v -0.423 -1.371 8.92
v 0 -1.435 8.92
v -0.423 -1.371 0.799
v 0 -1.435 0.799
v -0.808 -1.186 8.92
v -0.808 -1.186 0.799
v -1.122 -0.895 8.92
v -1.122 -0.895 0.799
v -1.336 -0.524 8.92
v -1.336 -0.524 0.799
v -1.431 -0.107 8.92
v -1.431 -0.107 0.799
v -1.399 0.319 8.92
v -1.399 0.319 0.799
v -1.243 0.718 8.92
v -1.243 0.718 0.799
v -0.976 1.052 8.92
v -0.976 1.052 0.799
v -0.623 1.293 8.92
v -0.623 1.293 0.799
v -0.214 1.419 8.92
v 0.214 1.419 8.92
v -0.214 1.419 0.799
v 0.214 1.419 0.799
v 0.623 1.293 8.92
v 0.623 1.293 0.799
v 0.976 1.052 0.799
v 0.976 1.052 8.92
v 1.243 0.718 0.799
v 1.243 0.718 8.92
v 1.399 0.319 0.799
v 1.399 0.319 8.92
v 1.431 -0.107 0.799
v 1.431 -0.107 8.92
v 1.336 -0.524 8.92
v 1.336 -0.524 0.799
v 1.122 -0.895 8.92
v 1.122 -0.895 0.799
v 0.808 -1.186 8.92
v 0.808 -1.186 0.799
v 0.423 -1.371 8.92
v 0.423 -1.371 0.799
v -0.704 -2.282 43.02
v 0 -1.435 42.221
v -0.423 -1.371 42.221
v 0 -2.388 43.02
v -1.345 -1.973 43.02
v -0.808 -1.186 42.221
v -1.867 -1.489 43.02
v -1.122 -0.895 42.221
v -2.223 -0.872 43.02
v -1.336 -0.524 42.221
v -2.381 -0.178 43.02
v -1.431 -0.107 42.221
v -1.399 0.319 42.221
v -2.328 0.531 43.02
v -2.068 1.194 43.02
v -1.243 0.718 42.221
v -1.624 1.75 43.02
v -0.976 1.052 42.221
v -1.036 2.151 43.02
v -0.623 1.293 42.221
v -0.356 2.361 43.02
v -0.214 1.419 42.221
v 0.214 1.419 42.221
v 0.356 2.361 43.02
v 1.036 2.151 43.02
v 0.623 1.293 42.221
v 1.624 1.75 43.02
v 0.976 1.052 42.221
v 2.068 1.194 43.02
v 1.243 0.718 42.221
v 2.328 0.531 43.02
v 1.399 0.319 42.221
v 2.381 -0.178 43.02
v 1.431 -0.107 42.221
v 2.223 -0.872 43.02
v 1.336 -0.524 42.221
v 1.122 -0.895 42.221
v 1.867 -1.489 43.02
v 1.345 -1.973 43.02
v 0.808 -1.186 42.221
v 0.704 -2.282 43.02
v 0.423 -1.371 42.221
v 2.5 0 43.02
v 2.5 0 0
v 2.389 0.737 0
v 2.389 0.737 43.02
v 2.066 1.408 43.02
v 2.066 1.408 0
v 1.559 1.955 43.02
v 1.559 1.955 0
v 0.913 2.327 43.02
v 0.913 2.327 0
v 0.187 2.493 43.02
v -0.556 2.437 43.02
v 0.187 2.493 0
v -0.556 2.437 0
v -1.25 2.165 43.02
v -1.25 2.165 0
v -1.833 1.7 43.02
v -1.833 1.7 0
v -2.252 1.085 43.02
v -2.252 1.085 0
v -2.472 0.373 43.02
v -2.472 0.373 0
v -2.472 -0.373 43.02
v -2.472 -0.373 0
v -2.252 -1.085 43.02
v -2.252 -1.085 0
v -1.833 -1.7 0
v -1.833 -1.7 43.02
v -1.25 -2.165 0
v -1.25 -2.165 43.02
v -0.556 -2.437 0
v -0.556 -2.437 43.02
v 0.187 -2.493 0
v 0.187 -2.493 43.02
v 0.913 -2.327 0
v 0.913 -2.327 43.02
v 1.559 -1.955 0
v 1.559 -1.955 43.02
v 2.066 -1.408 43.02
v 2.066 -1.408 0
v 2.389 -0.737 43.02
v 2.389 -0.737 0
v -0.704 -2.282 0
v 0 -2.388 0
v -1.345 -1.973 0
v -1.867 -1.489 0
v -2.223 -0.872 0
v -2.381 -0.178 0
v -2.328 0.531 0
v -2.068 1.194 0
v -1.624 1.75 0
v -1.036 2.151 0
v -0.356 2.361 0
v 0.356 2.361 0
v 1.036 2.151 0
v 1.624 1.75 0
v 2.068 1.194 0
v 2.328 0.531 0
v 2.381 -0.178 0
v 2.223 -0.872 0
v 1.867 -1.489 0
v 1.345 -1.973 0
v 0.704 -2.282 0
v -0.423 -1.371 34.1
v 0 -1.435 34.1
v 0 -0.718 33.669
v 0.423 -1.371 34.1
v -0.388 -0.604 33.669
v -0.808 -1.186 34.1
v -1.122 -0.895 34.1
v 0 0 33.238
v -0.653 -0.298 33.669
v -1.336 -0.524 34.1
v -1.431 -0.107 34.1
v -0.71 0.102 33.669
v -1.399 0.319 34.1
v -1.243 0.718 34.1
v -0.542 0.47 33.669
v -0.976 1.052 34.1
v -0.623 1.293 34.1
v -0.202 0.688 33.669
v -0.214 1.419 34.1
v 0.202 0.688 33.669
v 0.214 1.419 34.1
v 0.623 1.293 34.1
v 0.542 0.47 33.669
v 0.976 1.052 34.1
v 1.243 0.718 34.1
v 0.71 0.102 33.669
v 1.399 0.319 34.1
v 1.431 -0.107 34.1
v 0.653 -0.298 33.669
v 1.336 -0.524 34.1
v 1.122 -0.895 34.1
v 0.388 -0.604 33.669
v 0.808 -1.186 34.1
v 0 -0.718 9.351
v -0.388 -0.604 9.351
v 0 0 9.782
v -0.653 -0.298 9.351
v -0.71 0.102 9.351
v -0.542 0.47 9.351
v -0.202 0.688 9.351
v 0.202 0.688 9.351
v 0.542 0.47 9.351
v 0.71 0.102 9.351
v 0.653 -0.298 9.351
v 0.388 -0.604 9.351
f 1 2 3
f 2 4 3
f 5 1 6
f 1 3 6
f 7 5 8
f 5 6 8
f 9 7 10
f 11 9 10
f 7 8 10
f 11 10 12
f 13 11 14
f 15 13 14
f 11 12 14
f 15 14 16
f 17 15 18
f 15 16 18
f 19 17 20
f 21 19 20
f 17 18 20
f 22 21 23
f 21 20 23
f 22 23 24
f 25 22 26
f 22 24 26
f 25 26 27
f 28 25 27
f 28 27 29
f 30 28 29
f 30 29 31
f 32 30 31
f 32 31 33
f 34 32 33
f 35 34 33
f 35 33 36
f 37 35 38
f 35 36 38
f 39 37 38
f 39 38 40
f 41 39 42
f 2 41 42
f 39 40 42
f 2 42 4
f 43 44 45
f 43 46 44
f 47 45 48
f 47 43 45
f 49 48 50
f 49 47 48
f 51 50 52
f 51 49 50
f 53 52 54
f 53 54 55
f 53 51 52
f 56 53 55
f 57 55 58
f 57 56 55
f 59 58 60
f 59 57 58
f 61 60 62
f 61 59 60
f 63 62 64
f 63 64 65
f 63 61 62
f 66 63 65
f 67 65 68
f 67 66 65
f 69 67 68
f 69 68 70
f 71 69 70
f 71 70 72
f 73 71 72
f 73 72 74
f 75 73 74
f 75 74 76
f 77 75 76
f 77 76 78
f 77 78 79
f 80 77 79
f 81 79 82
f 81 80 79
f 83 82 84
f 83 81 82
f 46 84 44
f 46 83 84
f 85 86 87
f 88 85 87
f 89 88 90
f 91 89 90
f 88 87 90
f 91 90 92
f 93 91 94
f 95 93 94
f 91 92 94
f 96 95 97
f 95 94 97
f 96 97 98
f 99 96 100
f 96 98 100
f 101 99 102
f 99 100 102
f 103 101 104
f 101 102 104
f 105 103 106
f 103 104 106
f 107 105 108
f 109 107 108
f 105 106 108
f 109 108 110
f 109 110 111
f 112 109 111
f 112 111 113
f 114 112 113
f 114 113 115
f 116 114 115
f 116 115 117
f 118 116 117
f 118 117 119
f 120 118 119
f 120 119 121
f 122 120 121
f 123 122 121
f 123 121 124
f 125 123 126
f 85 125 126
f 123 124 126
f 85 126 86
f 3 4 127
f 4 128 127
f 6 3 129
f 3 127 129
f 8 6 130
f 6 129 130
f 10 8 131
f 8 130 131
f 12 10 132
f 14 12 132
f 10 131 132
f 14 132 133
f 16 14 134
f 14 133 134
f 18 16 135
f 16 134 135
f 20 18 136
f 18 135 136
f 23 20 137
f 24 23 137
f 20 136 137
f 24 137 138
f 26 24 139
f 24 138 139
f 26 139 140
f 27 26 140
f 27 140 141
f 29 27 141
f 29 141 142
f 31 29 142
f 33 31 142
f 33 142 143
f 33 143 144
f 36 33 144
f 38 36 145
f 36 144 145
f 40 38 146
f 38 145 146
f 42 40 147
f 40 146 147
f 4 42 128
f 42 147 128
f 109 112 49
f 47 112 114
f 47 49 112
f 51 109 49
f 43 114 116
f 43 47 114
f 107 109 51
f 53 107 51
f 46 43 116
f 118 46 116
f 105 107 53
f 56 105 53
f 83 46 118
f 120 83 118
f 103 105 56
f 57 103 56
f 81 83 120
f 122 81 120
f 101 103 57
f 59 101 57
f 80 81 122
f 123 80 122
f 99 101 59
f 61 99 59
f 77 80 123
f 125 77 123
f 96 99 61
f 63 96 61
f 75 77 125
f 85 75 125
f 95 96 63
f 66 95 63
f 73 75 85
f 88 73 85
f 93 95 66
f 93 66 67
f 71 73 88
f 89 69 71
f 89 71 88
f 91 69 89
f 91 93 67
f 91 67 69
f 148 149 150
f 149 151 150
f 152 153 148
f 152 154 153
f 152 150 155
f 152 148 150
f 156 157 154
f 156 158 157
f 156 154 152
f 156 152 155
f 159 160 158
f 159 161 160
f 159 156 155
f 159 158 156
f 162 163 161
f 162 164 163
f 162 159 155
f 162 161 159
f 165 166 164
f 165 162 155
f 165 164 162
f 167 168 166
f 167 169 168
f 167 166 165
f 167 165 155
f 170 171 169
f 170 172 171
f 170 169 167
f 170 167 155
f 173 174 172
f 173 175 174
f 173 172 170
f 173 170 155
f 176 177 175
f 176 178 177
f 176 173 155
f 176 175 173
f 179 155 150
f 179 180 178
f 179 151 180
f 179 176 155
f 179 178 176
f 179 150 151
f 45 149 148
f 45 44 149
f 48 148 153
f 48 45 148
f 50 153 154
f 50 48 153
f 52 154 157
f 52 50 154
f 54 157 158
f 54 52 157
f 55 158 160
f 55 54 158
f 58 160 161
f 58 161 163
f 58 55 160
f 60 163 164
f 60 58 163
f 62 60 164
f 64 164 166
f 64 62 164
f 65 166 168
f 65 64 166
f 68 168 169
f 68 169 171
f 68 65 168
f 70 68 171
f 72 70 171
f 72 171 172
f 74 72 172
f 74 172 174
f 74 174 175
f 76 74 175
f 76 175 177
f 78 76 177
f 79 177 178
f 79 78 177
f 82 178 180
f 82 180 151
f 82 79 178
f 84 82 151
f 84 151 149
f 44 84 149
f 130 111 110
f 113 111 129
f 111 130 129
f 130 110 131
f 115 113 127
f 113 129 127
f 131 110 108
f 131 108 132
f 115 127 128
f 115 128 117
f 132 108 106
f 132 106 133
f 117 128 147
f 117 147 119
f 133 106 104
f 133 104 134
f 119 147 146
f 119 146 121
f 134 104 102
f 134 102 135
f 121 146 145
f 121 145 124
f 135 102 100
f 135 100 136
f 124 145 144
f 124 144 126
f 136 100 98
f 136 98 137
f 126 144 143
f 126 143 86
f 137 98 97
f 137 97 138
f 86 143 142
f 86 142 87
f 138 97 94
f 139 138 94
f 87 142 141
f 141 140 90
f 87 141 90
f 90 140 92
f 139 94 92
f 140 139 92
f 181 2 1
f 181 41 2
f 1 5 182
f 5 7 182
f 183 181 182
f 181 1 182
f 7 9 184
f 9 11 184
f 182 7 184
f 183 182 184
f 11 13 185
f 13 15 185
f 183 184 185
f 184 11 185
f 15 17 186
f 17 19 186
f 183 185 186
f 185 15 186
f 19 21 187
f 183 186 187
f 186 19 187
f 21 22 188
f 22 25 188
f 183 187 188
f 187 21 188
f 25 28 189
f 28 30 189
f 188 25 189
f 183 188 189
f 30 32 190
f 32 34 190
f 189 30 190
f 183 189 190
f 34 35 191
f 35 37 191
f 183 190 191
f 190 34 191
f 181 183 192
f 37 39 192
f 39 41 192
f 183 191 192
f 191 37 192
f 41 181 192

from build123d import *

# Parameters (mm, degrees)
SKETCH1_R           = 2.5
BOSS_EXTRUDE1_DEPTH = 43.02


with BuildPart() as part:
    # Sketch1 → Boss-Extrude1 (new body)
    with BuildSketch(Plane.XY):
        Circle(SKETCH1_R)
    extrude(amount=BOSS_EXTRUDE1_DEPTH)

    # Sketch3 → #6-40 Tapped Hole1 (revolve, cut)
    with BuildSketch(Plane(origin=(0, 0, 43.02), x_dir=(0, -1, 0), z_dir=(1, 0, 0))):
        Polygon((0, 0), (0, 9.782295074), (1.4351, 8.92), (1.4351, 0.799242399), (2.3876, 0), align=None)
    f_6_40_tapped_hole1 = revolve(axis=Axis((0, 0, 49.37), (0, 0, -1)), mode=Mode.SUBTRACT)

    # Mirror1: #6-40 Tapped Hole1 across plane
    add(f_6_40_tapped_hole1.mirror(Plane.XY.offset(21.51)), mode=Mode.SUBTRACT)


solid = part.part
